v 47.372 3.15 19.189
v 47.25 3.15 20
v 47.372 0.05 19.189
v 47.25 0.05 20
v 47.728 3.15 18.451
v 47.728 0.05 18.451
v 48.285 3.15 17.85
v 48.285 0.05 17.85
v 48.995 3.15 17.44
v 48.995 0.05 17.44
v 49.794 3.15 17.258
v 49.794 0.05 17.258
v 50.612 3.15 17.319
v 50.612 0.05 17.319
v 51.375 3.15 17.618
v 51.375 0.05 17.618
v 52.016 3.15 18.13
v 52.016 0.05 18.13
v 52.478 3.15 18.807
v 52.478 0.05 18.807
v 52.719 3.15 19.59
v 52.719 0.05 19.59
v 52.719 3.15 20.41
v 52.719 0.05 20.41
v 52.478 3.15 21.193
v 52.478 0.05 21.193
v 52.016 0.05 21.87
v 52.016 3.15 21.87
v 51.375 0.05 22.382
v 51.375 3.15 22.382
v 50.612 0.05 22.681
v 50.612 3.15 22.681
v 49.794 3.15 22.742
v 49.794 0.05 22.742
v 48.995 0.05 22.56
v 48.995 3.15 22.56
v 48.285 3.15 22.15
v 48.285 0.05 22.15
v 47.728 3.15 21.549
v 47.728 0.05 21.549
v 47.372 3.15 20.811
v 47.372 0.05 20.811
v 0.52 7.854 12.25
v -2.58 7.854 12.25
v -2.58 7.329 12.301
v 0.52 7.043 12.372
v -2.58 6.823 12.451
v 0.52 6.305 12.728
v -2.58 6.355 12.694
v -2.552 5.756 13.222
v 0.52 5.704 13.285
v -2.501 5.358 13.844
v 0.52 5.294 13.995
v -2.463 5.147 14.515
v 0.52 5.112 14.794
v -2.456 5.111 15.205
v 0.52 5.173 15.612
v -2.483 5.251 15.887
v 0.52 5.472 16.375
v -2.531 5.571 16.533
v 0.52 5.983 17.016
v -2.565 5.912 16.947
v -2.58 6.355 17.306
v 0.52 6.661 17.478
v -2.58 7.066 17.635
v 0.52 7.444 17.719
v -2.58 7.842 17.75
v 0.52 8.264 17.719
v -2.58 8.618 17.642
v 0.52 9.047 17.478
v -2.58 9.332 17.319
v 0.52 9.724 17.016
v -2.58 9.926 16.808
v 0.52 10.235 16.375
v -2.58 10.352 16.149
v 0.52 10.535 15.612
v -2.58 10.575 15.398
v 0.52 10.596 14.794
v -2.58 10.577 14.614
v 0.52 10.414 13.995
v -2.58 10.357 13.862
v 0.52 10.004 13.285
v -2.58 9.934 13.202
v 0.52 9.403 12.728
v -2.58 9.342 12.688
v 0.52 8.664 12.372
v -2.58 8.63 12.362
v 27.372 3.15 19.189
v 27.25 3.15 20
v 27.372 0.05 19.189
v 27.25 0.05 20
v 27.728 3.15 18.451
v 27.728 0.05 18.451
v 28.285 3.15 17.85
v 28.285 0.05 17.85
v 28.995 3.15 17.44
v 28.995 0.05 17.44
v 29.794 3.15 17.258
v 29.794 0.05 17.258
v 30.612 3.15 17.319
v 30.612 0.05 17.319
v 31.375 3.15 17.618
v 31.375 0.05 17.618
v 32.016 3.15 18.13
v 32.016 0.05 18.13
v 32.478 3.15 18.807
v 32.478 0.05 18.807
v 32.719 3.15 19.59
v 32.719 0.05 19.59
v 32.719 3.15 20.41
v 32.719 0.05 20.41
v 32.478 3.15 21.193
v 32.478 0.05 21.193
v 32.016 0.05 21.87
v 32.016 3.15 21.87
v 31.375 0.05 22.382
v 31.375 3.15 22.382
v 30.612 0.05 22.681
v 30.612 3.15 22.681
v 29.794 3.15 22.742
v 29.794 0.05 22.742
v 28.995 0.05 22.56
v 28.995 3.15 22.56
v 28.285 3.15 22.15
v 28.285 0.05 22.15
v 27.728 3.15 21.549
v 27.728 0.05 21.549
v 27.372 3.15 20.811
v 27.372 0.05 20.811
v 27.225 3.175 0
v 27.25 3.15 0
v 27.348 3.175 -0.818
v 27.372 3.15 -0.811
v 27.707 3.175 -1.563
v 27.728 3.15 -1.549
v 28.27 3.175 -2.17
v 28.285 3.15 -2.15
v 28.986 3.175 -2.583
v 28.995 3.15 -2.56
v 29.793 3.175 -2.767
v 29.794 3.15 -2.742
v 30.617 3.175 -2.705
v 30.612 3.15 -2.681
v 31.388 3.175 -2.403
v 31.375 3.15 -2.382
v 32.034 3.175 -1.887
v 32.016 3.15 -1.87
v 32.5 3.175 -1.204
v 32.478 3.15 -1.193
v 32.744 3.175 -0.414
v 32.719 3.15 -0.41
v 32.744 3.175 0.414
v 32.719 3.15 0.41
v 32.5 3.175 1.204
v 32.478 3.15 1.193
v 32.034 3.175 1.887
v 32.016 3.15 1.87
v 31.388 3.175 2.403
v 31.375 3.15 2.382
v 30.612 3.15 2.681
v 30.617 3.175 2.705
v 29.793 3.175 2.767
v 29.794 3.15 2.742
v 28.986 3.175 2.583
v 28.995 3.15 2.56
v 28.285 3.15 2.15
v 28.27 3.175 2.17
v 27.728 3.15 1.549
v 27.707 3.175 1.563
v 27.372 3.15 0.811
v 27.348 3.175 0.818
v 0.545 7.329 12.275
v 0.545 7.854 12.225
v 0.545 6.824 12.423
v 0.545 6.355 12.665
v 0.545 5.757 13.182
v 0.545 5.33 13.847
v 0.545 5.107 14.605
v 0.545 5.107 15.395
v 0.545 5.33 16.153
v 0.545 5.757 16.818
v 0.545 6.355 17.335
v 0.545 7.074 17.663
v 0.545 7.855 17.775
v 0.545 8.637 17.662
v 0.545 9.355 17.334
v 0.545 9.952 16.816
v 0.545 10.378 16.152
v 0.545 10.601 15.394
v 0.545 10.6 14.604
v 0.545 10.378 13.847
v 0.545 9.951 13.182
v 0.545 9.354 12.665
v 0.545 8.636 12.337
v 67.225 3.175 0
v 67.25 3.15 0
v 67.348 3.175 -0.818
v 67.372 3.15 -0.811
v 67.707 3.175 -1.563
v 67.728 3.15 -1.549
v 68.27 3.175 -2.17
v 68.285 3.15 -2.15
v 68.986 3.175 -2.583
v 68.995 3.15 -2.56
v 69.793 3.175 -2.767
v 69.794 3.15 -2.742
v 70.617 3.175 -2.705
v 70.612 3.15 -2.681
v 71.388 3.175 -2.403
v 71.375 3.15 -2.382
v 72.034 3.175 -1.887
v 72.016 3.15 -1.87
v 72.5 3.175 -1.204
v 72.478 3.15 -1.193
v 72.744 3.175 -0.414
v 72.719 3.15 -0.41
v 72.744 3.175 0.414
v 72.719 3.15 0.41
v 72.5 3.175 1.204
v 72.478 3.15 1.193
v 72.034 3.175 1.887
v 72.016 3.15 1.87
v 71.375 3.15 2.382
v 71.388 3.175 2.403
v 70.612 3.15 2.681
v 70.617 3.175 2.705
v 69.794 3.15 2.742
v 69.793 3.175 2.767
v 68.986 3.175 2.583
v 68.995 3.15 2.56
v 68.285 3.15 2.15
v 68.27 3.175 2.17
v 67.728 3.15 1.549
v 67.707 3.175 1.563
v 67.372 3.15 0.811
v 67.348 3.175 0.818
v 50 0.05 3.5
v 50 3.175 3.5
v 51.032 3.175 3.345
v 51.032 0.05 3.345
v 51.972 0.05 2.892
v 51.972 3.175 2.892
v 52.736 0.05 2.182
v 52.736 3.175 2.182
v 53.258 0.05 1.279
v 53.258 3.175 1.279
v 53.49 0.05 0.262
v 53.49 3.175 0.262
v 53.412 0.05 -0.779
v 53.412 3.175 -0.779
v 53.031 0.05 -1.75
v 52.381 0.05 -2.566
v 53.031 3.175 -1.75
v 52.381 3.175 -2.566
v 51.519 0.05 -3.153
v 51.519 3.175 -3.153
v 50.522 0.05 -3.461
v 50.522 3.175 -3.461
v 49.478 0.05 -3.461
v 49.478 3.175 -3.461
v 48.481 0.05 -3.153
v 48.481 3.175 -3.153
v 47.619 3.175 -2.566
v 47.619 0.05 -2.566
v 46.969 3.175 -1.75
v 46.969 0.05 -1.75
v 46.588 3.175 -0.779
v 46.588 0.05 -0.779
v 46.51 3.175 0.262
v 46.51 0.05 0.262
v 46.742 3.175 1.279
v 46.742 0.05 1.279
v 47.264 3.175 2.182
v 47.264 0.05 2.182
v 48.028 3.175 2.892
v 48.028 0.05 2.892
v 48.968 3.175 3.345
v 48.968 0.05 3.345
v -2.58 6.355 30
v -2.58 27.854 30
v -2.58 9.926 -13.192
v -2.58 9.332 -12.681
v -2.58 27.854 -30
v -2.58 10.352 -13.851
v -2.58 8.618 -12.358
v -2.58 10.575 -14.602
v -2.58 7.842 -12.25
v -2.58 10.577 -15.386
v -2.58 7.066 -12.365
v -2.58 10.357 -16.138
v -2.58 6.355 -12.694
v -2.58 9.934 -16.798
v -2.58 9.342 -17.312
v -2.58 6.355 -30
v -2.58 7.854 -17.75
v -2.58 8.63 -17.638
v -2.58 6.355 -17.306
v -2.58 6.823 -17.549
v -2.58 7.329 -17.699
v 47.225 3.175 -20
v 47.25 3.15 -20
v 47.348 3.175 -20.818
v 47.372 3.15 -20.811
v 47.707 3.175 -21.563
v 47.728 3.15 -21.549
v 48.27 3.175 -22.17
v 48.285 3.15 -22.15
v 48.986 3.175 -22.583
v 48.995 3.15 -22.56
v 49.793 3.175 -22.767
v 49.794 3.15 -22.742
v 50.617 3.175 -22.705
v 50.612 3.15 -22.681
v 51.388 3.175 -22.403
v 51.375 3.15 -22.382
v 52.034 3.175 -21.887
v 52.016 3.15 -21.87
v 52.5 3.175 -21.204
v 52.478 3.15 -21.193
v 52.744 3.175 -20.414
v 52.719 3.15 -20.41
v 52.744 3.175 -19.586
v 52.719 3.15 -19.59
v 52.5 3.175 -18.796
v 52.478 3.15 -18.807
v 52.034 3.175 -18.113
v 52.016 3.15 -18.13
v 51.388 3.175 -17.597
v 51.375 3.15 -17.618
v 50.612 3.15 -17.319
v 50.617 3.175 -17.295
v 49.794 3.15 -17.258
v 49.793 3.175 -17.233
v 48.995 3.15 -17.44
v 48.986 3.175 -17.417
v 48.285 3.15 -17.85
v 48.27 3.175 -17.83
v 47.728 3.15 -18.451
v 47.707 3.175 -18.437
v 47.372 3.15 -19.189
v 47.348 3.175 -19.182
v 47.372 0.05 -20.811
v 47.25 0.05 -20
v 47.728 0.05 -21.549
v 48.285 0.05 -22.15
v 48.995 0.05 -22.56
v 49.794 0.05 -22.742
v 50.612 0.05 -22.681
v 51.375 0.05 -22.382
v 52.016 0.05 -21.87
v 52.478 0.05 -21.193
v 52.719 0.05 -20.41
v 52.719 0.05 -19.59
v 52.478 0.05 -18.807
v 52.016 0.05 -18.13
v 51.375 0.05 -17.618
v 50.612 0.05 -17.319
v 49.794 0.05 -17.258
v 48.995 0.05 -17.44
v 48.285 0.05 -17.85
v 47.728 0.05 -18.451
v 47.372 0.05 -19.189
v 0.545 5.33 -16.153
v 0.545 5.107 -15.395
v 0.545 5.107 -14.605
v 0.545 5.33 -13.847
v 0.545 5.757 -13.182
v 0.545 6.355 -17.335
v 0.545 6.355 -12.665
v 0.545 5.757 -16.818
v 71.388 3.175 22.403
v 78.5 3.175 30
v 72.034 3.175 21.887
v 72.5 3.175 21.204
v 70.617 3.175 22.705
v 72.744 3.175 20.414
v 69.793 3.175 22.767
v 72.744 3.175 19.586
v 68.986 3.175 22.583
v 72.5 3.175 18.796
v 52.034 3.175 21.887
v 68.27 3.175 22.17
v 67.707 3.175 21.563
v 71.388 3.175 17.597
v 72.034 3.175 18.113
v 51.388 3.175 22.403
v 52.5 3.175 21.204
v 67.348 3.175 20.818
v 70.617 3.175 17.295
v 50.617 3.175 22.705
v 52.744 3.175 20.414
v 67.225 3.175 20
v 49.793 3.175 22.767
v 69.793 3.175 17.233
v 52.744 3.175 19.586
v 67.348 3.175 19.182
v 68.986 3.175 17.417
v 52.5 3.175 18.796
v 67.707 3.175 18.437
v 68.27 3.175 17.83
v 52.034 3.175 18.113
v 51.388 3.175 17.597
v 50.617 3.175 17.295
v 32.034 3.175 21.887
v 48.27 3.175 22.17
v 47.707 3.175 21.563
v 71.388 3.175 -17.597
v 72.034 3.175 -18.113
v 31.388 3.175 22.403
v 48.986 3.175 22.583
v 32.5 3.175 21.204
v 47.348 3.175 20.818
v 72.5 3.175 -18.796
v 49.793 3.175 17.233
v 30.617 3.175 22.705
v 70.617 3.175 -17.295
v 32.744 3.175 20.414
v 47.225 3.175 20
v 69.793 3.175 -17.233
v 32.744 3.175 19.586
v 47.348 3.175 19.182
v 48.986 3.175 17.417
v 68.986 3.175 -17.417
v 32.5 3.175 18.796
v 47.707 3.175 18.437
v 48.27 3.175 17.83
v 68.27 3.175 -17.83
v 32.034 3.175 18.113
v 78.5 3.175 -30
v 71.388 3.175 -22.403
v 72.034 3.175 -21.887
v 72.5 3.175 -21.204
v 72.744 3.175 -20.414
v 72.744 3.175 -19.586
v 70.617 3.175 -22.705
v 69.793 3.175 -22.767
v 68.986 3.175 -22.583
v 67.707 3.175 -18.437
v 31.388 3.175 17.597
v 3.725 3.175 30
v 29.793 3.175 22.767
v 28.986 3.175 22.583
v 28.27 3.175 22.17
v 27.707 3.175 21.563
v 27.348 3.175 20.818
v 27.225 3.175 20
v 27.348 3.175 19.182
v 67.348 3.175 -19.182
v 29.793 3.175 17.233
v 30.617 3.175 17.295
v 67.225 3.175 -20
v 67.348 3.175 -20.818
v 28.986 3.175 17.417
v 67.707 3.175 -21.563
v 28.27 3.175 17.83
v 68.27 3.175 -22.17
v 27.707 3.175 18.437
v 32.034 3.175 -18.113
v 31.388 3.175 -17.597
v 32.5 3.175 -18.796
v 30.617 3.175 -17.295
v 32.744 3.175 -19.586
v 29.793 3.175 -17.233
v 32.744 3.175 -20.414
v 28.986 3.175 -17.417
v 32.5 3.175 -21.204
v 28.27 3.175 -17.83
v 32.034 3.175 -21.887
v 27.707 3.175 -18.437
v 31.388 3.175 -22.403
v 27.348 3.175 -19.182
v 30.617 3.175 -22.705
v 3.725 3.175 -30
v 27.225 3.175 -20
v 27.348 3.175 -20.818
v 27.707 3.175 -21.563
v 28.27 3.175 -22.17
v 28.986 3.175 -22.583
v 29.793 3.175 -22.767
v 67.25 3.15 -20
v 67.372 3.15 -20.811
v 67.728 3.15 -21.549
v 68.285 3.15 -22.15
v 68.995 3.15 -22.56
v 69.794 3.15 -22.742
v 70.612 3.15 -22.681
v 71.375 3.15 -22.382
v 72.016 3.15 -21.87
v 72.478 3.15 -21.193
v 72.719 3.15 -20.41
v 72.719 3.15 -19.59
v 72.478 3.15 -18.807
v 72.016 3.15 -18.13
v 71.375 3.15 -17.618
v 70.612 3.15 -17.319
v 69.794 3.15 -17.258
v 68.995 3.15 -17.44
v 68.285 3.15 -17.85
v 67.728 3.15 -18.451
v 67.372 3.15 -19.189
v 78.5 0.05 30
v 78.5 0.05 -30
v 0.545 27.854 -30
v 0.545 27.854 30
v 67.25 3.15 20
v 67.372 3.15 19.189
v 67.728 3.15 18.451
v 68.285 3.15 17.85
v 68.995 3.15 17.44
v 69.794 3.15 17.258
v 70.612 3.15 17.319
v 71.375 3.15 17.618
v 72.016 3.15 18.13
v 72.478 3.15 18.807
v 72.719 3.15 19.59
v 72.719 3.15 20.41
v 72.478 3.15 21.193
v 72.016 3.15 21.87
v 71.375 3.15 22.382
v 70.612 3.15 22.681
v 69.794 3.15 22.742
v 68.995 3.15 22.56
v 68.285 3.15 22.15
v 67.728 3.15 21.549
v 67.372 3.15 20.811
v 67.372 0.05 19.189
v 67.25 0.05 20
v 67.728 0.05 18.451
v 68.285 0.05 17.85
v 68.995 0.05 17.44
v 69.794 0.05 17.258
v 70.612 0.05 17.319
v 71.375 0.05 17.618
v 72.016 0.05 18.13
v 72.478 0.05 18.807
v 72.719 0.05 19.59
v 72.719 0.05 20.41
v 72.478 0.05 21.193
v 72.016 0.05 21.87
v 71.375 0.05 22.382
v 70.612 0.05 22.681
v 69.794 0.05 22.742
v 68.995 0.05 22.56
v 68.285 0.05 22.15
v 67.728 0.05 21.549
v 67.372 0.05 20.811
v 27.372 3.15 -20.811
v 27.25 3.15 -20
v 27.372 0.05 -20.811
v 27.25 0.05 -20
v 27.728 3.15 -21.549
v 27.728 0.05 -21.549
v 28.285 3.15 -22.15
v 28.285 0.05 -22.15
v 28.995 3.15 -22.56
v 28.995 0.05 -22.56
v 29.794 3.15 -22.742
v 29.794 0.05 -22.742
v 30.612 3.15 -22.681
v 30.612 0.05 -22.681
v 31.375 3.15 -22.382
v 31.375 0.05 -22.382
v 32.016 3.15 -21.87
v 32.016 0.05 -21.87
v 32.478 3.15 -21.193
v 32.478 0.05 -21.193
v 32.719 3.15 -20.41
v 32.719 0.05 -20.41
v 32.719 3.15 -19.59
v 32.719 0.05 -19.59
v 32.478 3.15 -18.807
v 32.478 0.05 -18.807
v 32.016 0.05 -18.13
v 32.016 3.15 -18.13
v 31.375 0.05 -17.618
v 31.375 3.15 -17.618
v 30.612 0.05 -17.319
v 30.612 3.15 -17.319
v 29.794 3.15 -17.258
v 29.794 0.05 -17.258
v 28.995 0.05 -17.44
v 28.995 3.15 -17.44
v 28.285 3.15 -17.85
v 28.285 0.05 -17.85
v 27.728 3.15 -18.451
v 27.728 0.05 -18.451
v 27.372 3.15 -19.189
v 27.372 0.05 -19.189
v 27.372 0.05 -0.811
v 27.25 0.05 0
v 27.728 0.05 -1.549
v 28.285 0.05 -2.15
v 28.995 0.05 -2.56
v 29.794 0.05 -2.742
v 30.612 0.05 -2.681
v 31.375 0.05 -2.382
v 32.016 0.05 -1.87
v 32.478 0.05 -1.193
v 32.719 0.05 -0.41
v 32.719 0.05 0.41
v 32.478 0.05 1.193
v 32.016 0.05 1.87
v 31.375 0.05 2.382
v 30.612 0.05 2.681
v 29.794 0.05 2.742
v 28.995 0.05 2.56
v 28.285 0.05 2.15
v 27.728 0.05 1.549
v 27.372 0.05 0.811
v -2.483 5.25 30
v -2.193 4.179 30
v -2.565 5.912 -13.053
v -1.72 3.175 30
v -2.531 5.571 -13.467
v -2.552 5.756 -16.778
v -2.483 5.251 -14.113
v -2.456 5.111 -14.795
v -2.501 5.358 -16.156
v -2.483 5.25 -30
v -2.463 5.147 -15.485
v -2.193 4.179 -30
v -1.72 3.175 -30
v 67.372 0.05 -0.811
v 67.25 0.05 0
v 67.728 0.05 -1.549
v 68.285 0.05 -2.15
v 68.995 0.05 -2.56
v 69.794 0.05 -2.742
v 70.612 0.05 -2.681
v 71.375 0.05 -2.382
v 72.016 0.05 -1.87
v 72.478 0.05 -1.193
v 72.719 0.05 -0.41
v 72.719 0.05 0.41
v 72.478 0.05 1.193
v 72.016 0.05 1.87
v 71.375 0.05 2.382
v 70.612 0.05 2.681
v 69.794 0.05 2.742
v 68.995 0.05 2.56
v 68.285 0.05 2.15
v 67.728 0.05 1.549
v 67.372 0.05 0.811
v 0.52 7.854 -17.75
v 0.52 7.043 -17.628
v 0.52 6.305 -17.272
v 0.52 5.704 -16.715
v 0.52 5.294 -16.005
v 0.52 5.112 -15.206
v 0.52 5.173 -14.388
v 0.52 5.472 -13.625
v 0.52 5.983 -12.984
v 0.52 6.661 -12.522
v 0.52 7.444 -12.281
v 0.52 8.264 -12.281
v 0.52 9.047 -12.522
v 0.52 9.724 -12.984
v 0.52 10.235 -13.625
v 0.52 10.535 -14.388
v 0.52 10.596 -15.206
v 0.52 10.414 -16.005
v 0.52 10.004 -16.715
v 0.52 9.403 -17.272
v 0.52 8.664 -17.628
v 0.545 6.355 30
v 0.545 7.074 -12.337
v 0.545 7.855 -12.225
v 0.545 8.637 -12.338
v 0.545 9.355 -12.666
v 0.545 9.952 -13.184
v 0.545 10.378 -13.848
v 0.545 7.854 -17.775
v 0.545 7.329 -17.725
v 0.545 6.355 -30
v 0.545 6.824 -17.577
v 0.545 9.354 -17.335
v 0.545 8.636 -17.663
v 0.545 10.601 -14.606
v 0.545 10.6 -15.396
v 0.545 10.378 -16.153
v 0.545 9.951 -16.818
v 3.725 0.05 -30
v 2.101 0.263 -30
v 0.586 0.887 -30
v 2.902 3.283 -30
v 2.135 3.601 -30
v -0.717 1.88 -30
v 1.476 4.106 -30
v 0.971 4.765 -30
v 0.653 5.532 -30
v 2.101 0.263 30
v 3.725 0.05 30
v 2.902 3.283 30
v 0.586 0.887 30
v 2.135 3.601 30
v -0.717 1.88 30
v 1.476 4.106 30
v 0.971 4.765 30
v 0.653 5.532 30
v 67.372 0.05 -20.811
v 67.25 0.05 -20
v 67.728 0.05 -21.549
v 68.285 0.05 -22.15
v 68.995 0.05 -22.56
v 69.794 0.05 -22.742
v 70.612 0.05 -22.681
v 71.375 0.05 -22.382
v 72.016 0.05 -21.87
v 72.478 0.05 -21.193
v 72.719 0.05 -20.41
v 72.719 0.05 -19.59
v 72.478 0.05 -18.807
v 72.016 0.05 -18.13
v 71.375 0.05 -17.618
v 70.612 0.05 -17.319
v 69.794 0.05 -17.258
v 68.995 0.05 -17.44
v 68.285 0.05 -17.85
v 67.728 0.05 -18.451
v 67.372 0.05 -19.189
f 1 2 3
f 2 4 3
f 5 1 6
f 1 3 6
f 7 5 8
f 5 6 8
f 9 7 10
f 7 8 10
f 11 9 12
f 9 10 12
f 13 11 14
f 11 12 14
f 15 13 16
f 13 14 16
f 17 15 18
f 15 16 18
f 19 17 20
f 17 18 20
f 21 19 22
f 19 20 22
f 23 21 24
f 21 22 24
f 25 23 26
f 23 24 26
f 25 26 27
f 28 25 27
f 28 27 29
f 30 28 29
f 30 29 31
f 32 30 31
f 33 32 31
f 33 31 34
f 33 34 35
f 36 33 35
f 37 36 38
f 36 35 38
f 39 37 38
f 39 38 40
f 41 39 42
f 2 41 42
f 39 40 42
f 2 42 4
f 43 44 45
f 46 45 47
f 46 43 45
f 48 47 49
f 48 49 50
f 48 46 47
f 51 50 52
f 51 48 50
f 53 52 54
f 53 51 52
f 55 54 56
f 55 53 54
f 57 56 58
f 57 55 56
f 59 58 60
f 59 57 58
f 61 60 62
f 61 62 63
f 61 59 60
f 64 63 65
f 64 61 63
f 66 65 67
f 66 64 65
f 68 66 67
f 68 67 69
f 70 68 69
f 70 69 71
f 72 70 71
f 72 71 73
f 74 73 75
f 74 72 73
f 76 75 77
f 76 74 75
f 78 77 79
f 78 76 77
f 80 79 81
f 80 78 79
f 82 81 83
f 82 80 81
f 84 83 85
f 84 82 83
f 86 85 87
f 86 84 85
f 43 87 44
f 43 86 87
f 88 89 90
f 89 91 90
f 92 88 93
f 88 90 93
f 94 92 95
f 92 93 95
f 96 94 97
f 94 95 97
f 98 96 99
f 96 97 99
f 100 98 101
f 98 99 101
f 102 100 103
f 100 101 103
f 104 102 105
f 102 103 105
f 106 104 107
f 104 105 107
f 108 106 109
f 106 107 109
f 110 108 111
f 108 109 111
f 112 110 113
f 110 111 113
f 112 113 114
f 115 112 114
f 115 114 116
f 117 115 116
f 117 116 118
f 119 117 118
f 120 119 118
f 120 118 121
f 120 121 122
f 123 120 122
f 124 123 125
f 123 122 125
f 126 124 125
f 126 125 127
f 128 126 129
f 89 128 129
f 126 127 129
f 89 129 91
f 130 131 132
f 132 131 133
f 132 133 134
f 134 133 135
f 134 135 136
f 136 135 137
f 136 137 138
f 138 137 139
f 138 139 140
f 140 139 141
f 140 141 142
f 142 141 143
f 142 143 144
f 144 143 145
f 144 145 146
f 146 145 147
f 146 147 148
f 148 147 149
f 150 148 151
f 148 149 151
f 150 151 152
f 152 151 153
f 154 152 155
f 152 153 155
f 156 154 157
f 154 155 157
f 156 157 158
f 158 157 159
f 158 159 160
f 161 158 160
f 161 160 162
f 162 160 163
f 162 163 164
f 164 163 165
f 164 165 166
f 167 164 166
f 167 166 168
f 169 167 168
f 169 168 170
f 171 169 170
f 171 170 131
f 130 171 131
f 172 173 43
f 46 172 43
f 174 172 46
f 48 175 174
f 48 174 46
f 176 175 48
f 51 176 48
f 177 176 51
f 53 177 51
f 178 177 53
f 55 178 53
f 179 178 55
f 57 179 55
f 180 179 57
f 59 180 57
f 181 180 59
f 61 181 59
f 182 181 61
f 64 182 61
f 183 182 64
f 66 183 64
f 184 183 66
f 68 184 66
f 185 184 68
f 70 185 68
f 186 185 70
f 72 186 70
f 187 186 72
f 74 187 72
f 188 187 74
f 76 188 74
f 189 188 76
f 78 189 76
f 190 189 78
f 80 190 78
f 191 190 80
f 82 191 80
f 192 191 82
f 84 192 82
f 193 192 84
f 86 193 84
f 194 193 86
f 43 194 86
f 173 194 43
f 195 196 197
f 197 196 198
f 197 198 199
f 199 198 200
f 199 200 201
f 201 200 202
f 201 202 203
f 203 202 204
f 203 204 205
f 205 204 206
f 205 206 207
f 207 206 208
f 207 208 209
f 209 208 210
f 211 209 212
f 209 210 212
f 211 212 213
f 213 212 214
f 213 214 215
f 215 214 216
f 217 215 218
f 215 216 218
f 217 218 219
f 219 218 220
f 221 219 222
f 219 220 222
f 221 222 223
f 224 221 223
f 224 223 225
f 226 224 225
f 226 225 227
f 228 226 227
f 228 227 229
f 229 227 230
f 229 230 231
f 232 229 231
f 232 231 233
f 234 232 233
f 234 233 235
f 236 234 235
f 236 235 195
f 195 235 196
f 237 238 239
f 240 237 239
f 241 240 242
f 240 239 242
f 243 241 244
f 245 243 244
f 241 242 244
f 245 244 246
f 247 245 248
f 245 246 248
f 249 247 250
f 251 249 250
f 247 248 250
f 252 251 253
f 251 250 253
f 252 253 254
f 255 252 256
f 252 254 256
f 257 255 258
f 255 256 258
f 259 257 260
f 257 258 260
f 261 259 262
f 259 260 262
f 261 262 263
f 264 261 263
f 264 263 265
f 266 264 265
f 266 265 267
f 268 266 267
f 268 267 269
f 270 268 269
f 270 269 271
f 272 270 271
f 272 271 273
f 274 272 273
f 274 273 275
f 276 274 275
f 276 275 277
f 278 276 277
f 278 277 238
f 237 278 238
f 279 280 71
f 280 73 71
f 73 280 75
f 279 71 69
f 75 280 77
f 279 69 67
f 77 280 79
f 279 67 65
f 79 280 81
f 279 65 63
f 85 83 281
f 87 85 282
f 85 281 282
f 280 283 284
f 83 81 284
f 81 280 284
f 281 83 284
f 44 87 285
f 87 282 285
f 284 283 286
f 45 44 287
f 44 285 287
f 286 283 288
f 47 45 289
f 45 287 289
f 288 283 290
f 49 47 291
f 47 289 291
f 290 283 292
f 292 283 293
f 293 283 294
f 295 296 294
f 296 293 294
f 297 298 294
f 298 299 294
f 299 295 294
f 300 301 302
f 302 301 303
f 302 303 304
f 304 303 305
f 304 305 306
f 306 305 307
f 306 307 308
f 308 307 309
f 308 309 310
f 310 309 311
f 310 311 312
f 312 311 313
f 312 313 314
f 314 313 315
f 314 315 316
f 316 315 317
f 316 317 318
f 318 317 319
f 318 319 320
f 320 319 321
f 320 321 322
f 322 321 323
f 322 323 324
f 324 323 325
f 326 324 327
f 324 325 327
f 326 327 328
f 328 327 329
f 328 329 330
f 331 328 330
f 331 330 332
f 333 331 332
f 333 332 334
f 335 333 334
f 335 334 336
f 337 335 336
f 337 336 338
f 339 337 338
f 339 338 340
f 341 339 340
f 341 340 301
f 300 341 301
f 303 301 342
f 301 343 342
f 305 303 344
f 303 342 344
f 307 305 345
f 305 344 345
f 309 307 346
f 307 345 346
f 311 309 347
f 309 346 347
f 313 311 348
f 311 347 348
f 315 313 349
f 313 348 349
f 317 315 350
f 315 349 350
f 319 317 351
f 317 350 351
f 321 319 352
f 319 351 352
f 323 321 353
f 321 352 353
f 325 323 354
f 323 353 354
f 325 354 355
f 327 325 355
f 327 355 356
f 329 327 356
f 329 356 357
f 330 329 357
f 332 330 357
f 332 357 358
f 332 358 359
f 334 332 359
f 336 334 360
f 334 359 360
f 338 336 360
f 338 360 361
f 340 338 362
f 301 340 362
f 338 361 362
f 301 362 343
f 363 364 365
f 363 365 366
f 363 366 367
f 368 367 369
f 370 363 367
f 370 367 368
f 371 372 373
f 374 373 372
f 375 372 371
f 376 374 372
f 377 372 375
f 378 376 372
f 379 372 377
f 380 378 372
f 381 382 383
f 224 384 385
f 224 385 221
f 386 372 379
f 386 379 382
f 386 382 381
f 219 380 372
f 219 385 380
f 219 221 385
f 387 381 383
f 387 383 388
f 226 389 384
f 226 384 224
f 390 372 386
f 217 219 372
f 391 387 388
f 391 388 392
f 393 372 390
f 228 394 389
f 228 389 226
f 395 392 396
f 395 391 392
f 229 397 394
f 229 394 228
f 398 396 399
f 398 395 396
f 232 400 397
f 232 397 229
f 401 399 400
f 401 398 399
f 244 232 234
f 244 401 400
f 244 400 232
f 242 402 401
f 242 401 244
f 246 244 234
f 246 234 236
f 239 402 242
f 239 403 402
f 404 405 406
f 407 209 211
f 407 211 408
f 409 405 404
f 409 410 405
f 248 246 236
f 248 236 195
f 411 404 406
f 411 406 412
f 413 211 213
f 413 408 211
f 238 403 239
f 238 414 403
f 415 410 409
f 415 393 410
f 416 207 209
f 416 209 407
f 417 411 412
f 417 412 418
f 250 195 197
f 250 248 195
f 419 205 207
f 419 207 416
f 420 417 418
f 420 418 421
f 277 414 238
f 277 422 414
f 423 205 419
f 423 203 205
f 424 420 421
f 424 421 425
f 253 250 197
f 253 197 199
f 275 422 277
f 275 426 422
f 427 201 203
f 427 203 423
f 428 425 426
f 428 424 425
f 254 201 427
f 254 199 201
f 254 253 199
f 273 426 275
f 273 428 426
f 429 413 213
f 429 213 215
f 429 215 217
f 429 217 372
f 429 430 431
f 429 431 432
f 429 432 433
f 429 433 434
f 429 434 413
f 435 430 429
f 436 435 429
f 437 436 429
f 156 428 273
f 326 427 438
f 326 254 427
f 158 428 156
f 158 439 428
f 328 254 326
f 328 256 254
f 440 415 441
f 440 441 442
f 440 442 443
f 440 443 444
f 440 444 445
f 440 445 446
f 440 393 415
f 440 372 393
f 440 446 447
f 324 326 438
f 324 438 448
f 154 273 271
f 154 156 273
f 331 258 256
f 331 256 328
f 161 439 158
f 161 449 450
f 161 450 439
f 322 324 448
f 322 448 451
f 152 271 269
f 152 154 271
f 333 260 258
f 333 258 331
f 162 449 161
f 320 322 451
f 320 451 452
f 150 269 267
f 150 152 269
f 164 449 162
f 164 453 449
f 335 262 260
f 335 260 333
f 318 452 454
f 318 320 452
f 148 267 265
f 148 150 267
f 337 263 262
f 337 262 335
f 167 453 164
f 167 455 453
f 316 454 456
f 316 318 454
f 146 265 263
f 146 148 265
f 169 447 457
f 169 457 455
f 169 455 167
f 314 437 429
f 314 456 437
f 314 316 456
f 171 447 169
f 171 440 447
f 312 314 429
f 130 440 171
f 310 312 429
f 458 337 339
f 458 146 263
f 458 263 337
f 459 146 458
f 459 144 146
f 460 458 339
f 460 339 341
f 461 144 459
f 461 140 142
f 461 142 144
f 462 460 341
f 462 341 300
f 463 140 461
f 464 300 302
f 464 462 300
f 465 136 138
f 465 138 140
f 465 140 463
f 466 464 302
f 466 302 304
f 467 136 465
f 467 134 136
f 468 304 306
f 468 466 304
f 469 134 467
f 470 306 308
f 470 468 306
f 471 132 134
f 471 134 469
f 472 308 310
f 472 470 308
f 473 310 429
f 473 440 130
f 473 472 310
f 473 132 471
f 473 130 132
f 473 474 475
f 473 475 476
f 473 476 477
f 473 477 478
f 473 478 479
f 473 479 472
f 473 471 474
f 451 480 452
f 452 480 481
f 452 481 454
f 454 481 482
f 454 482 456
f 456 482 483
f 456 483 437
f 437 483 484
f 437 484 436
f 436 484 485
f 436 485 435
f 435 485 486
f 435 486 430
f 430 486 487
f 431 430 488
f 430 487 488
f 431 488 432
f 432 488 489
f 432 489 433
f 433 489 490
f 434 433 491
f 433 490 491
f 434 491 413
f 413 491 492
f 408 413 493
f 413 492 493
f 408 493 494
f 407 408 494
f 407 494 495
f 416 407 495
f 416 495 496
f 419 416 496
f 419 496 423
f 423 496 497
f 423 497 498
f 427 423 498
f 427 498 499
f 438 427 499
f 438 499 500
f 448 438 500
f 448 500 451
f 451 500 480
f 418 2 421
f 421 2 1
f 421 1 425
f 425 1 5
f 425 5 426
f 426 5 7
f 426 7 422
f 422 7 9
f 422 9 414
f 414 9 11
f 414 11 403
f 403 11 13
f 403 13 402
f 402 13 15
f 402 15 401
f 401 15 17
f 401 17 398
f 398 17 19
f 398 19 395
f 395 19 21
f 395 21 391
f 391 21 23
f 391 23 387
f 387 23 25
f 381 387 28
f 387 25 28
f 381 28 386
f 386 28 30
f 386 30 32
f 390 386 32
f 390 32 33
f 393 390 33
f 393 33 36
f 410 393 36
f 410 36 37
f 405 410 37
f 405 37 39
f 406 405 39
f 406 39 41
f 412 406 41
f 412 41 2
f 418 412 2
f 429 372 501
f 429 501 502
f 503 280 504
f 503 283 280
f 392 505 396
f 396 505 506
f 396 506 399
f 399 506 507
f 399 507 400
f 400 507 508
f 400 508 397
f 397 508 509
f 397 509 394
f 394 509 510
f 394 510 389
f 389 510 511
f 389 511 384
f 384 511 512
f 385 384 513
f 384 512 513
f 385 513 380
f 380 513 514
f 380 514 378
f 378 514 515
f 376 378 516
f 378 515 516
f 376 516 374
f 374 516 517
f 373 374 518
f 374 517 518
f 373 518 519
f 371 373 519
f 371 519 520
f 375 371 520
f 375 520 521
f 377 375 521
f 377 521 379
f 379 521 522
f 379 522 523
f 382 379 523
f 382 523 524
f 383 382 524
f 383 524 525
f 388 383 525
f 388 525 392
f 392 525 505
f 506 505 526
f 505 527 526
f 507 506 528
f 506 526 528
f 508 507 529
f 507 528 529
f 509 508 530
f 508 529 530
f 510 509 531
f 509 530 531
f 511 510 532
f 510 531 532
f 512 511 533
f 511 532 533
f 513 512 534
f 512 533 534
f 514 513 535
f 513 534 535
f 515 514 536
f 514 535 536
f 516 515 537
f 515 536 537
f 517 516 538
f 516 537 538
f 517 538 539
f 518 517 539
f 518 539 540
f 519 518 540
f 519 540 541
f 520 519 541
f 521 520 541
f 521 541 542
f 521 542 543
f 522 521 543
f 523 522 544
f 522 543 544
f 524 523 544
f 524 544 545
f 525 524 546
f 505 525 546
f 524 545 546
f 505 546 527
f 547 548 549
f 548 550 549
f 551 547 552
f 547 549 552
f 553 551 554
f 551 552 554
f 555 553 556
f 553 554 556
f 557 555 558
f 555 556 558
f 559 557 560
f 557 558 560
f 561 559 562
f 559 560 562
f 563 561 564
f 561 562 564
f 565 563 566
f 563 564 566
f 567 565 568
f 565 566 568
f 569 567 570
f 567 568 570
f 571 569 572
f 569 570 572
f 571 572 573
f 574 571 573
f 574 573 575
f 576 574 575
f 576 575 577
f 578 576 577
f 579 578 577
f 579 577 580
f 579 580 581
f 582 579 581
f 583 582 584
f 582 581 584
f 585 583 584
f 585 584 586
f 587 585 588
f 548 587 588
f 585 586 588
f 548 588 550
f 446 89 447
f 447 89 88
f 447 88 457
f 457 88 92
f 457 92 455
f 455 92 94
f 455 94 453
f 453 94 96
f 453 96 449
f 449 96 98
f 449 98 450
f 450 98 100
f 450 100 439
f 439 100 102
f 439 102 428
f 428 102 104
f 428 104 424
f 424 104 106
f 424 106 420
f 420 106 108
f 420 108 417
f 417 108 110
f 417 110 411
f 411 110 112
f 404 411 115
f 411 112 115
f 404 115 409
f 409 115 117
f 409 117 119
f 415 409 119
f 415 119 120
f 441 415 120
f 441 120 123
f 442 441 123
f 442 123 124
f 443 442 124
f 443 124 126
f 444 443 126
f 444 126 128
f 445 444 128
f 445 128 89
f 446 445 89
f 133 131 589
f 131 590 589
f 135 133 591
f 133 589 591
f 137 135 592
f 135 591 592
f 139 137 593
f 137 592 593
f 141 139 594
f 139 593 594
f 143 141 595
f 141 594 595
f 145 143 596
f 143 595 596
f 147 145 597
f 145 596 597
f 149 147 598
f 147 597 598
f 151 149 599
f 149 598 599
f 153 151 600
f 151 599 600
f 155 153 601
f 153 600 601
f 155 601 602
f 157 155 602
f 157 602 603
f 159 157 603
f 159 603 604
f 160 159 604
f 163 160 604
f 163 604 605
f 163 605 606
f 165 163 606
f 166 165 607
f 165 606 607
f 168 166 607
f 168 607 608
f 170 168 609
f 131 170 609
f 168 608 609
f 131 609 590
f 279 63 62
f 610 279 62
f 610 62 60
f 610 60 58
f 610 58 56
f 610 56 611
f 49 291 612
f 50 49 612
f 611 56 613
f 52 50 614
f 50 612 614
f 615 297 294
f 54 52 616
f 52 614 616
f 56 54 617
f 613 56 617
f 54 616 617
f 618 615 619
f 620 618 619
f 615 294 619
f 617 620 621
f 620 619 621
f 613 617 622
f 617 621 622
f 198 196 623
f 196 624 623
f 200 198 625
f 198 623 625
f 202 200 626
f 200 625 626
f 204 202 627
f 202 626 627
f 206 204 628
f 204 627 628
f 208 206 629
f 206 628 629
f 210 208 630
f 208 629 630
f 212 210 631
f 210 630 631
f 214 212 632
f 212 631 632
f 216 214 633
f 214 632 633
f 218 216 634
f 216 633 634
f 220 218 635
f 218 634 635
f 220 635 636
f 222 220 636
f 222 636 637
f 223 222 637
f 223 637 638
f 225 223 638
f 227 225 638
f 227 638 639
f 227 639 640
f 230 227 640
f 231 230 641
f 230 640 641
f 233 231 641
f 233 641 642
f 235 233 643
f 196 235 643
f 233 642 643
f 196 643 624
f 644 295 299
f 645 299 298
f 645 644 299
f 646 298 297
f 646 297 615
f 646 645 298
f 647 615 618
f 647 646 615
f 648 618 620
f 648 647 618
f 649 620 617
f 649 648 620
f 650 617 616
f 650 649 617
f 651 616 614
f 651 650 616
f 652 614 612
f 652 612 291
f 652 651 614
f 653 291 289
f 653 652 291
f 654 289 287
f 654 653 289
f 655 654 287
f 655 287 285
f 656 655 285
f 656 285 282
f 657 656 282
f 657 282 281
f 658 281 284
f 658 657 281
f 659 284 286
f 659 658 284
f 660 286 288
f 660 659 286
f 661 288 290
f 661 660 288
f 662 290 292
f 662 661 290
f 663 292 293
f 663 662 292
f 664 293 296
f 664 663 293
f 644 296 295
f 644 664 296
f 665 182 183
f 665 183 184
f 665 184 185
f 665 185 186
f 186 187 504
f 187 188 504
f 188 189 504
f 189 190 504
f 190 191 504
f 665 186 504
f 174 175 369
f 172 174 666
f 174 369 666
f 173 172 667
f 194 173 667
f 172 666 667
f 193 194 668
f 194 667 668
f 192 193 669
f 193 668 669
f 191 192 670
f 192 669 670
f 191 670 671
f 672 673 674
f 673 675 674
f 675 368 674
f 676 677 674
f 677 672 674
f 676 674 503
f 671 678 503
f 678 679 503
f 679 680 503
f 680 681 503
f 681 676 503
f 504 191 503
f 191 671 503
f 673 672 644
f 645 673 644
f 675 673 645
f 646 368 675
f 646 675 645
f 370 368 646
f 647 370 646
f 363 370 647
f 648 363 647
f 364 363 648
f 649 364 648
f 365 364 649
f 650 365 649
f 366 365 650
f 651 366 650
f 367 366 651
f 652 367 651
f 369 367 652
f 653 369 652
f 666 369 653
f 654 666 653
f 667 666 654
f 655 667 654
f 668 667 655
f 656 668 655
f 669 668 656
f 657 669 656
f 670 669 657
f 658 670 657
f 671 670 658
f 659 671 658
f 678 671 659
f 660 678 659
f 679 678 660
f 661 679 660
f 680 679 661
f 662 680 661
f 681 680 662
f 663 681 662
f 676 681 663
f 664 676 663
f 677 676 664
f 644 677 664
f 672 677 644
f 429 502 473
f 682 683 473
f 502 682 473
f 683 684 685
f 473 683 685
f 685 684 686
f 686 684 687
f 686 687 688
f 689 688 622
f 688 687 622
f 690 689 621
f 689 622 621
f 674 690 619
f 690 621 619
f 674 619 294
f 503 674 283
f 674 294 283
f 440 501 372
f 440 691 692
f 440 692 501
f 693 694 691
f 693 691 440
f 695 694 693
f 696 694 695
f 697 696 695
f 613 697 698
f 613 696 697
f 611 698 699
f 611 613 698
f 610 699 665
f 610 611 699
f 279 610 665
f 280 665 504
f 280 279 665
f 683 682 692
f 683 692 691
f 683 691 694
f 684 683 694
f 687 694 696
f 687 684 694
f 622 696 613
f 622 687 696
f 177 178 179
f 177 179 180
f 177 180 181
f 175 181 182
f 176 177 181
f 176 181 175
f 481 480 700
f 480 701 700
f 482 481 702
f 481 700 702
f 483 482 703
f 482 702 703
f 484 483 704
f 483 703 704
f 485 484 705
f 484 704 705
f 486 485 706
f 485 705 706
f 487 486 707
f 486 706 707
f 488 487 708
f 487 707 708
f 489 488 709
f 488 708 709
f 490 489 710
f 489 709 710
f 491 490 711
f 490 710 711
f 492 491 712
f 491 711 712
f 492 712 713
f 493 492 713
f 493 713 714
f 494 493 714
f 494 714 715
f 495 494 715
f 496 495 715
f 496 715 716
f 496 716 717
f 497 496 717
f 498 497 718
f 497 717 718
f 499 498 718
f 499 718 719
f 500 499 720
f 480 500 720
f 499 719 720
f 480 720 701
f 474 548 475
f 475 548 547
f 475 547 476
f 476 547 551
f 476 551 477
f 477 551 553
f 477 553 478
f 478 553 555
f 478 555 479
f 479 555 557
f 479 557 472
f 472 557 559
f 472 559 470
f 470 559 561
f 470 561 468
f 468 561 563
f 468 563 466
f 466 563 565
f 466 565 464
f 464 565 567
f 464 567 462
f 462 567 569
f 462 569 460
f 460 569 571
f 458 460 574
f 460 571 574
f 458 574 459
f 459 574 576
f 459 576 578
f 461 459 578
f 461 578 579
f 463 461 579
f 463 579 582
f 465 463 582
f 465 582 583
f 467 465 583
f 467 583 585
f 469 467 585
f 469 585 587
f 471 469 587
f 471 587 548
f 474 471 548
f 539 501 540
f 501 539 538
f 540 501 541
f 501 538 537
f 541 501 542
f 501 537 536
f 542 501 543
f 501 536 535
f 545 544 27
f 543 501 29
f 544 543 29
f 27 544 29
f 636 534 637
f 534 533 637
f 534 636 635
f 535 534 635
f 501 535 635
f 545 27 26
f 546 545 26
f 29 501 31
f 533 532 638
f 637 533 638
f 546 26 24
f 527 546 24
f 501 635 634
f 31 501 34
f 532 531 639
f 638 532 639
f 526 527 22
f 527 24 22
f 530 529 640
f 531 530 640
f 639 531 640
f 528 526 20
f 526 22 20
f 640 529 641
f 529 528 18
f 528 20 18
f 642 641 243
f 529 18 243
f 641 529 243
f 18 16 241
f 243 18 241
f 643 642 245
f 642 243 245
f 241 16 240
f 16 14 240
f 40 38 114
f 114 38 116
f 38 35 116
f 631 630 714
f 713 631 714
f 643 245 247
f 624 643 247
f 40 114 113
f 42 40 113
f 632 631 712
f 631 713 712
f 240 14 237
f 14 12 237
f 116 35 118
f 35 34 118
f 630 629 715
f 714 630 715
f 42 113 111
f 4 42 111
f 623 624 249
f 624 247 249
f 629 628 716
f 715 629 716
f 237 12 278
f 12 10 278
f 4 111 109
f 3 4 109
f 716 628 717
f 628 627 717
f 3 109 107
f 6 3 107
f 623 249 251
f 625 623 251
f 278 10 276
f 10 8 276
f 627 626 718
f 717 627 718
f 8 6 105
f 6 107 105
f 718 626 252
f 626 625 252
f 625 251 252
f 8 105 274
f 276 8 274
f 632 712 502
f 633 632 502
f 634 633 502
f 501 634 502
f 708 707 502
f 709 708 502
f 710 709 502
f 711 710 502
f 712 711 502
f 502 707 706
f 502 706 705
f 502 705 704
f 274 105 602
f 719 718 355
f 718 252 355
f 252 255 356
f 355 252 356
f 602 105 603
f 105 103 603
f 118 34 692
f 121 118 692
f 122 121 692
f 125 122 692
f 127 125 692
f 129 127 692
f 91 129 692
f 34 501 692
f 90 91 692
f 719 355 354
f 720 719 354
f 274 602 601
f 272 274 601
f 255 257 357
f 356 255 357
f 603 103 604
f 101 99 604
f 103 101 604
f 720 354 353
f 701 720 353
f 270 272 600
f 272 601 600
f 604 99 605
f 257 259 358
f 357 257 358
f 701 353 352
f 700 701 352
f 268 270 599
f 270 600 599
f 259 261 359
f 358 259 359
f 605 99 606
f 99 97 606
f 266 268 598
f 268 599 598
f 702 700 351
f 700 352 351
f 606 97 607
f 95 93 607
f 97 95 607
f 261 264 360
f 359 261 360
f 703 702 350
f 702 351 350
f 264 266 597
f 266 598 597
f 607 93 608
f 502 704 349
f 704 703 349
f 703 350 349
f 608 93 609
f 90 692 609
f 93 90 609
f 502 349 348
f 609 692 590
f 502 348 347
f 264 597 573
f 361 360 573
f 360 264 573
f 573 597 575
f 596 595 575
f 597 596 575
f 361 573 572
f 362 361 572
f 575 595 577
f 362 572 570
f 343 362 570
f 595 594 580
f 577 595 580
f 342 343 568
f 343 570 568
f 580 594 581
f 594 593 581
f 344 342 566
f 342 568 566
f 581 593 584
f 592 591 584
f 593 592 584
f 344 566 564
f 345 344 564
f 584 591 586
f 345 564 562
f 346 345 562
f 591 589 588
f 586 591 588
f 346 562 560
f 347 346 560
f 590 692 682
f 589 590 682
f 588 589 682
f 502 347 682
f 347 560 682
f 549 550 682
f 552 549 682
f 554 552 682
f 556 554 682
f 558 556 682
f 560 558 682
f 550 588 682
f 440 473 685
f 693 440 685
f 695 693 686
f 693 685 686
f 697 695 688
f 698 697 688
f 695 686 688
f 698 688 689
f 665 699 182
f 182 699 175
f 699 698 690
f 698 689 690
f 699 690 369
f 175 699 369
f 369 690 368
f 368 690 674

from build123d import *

# Parameters (mm, degrees)
SKETCH1_W                      = 150
SKETCH1_H                      = 60
BOSS_EXTRUDE1_DEPTH            = 3.175
CONVERT_SOLID1_OUTLINE_W       = 150
CONVERT_SOLID1_OUTLINE_H       = 60
CONVERT_SOLID1_DEPTH           = 0.05
SKETCHED_START                 = -30
SKETCHED_BEND1_DEPTH           = 60
SKETCHED_BEND1_2_DEPTH         = 60
SKETCH12_W                     = 13.513441401
SKETCH12_H                     = 61.735090191
CUT_EXTRUDE1_DEPTH             = 51.24
SKETCH13_R                     = 3.5
CUT_EXTRUDE2_DEPTH             = 10
SKETCH14_W                     = 60
SKETCH14_H                     = 3.125
BOSS_EXTRUDE2_DEPTH            = 3.5
M5_CLEARANCE_HOLE1_D           = 5.5
M5_CLEARANCE_HOLE1_DEPTH       = 10.1
M5_CLEARANCE_HOLE1_CSINK_D     = 5.55
M5_CLEARANCE_HOLE1_CSINK_ANGLE = 90
M5_CLEARANCE_HOLE1_TIP         = 1.652366702
M5_CLEARANCE_HOLE2_AT_2_COUNT  = 2
M5_CLEARANCE_HOLE2_AT_2_PITCH  = 30


# Read off the part's stored shape, not the designer's step: Convert-Solid1, Sketched Bend1
with BuildPart() as part:
    # Sketch1 → Boss-Extrude1 (new body)
    with BuildSketch(Plane(origin=(0, 0, 0), x_dir=(1, 0, 0), z_dir=(0, 1, 0))):
        Rectangle(SKETCH1_W, SKETCH1_H)
    extrude(amount=BOSS_EXTRUDE1_DEPTH)

    # Convert-Solid1 outline → Convert-Solid1 (cut)
    with BuildSketch(Plane(origin=(0, 0, 0), x_dir=(1, 0, 0), z_dir=(0, 1, 0))):
        Rectangle(CONVERT_SOLID1_OUTLINE_W, CONVERT_SOLID1_OUTLINE_H)
    extrude(amount=CONVERT_SOLID1_DEPTH, mode=Mode.SUBTRACT)

    # Sketched Bend1 outline → Sketched Bend1 (cut)
    with BuildSketch(Plane.XY.offset(SKETCHED_START)):
        with BuildLine():
            ThreePointArc((3.72475079, 0.05), (0.586030908, 0.886777026), (-1.719569645, 3.175))
            Line((-1.719569645, 3.175), (-75, 3.175))
            Line((-75, 3.175), (-75, 0.05))
            Line((-75, 0.05), (3.72475079, 0.05))
        make_face()
    extrude(amount=SKETCHED_BEND1_DEPTH, mode=Mode.SUBTRACT)

    # Sketched Bend1 2 outline → Sketched Bend1 2 (add)
    with BuildSketch(Plane.XY.offset(SKETCHED_START)):
        with BuildLine():
            Line((0.54475079, 77.63024921), (-2.58024921, 77.63024921))
            Line((-2.58024921, 77.63024921), (-2.58024921, 6.355))
            ThreePointArc((-2.58024921, 6.355), (-2.361276869, 4.707792567), (-1.719569645, 3.175))
            Line((-1.719569645, 3.175), (3.72475079, 3.175))
            ThreePointArc((3.72475079, 3.175), (1.476151226, 4.106400436), (0.54475079, 6.355))
            Line((0.54475079, 6.355), (0.54475079, 77.63024921))
        make_face()
    extrude(amount=SKETCHED_BEND1_2_DEPTH)

    # Sketch12 → Cut-Extrude1 (cut)
    with BuildSketch(Plane(origin=(0, 79.093833736, 0), x_dir=(1, 0, 0), z_dir=(0, 1, 0))):
        with Locations((-1.719442409, -0.853480509)):
            Rectangle(SKETCH12_W, SKETCH12_H)
    extrude(amount=-CUT_EXTRUDE1_DEPTH, mode=Mode.SUBTRACT)

    # Sketch13 → Cut-Extrude2 (cut)
    with BuildSketch(Plane(origin=(0, 3.175, 0), x_dir=(1, 0, 0), z_dir=(0, 1, 0))):
        with Locations(Location((50, 0, 0), (0, 0, 270))):
            Circle(SKETCH13_R)
    extrude(amount=-CUT_EXTRUDE2_DEPTH, mode=Mode.SUBTRACT)

    # Sketch14 → Boss-Extrude2 (add)
    with BuildSketch(Plane(origin=(75, 0, 0), x_dir=(0, 0, -1), z_dir=(1, 0, 0))):
        with Locations((0, 1.6125)):
            Rectangle(SKETCH14_W, SKETCH14_H)
    extrude(amount=BOSS_EXTRUDE2_DEPTH)

    # M5 Clearance Hole1
    with Locations(Plane(origin=(0, 3.175, 0), x_dir=(1, 0, 0), z_dir=(0, 1, 0))):
        with Locations((30, 20), (70, 20), (70, -20), (30, -20), (50, 20), (50, -20), (70, 0), (30, 0)):
            CounterSinkHole(M5_CLEARANCE_HOLE1_D / 2, M5_CLEARANCE_HOLE1_CSINK_D / 2, depth=M5_CLEARANCE_HOLE1_DEPTH, counter_sink_angle=M5_CLEARANCE_HOLE1_CSINK_ANGLE)
            with Locations((0, 0, -(M5_CLEARANCE_HOLE1_DEPTH + M5_CLEARANCE_HOLE1_TIP / 2))):  # 118° drill point
                Cone(0, M5_CLEARANCE_HOLE1_D / 2, M5_CLEARANCE_HOLE1_TIP, mode=Mode.SUBTRACT)

    # Sketch21 → M5 Clearance Hole2 (revolve, cut)
    with BuildSketch(Plane(origin=(0.54475079, 7.853833736, 15), x_dir=(0, 0, -1), z_dir=(0, 1, 0))):
        Polygon((0, 0), (0, 11.752366702), (2.75, 10.1), (2.75, 0.025), (2.775, 0), align=None)
    m5_clearance_hole2 = revolve(axis=Axis((6.89475079, 7.853833736, 15), (-1, 0, 0)), mode=Mode.SUBTRACT)

    # M5 Clearance Hole2 at 2: M5 Clearance Hole2 ×2
    with Locations(*[(0, 0, -i * M5_CLEARANCE_HOLE2_AT_2_PITCH) for i in range(1, M5_CLEARANCE_HOLE2_AT_2_COUNT)]):
        add(m5_clearance_hole2, mode=Mode.SUBTRACT)


solid = part.part
